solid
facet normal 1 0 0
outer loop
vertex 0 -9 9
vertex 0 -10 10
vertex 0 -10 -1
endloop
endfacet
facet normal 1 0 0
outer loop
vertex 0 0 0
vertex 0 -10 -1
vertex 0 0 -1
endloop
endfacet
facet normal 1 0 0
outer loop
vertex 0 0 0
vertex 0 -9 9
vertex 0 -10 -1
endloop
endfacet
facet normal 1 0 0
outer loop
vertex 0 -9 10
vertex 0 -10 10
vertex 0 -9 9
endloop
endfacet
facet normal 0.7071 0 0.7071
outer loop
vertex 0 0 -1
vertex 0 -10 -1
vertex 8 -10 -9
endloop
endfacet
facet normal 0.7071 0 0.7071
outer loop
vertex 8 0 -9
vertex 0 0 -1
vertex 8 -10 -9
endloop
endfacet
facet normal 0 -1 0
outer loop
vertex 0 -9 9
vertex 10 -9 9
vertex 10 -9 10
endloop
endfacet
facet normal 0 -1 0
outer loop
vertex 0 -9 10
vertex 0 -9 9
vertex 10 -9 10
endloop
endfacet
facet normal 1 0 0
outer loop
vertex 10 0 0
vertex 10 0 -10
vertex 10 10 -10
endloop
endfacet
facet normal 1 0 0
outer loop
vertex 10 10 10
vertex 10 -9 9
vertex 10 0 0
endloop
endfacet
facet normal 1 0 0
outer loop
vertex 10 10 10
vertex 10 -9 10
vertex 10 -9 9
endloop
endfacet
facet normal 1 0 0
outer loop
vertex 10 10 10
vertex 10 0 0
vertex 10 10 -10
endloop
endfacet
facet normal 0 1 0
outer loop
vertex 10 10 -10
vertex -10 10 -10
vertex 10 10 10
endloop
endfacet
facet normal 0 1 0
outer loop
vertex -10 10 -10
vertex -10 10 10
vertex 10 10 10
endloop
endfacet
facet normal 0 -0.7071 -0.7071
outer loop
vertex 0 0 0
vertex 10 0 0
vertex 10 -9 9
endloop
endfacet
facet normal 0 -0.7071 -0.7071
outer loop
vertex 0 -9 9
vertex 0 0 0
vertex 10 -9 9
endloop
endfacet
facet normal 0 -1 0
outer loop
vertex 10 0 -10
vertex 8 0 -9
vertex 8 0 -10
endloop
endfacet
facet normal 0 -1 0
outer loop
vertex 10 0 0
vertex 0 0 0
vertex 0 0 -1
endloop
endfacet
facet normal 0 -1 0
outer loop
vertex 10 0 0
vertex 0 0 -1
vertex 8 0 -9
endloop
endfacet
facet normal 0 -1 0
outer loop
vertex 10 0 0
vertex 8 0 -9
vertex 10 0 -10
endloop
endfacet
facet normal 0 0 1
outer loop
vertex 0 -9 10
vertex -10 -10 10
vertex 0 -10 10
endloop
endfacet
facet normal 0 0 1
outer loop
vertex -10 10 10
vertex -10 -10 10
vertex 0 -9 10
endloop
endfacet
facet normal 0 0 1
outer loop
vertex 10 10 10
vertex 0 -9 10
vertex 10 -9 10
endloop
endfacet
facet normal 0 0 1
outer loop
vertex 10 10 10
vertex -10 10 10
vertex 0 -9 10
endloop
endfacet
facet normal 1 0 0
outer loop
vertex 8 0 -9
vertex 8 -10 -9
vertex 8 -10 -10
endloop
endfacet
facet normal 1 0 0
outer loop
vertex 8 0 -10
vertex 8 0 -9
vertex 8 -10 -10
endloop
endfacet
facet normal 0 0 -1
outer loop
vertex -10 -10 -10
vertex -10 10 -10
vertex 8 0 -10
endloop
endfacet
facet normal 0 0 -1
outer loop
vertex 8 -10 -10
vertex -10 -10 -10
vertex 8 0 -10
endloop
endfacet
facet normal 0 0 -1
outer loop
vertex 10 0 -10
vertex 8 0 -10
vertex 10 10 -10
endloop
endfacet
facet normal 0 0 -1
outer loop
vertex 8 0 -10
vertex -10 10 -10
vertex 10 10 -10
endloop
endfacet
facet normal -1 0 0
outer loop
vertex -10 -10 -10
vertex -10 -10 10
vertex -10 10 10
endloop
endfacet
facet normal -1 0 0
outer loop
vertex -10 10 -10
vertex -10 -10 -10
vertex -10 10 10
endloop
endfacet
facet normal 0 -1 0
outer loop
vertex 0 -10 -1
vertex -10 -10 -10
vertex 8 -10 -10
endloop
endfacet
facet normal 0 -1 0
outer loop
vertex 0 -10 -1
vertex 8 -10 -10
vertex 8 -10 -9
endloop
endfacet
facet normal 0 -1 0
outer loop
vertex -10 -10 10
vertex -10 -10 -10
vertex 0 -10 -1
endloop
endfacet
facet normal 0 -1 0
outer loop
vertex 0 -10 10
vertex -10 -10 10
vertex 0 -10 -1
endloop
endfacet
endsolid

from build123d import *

# Parameters (mm, degrees)
F0_W     = 20
F0_H     = 20
F1_DEPTH = 10
F3_DEPTH = 10
F4_DEPTH = 10
F6_DEPTH = 10


with BuildPart() as f1:
    # F0 (on Top) → F1 (new body)
    with BuildSketch(Plane.XY):
        Rectangle(F0_W, F0_H)
    extrude(amount=F1_DEPTH)

    # F2 (on face) → F3 (cut)
    with BuildSketch(Plane.YZ.offset(10)):
        Polygon((-9, 9), (-9, 10), (-10, 10), (-10, 0), (0, 0), align=None)
    extrude(amount=-F3_DEPTH, mode=Mode.SUBTRACT)

    # F0 (on Top) → F4 (join)
    with BuildSketch(Plane.XY):
        Rectangle(F0_W, F0_H)
    extrude(amount=-F4_DEPTH)

    # F5 (on face) → F6 (cut)
    with BuildSketch(Plane.XZ.offset(10)):
        Polygon((10, 0), (0, 0), (0, -1), (8, -9), (8, -10), (10, -10), align=None)
    extrude(amount=-F6_DEPTH, mode=Mode.SUBTRACT)


solid = f1.part
